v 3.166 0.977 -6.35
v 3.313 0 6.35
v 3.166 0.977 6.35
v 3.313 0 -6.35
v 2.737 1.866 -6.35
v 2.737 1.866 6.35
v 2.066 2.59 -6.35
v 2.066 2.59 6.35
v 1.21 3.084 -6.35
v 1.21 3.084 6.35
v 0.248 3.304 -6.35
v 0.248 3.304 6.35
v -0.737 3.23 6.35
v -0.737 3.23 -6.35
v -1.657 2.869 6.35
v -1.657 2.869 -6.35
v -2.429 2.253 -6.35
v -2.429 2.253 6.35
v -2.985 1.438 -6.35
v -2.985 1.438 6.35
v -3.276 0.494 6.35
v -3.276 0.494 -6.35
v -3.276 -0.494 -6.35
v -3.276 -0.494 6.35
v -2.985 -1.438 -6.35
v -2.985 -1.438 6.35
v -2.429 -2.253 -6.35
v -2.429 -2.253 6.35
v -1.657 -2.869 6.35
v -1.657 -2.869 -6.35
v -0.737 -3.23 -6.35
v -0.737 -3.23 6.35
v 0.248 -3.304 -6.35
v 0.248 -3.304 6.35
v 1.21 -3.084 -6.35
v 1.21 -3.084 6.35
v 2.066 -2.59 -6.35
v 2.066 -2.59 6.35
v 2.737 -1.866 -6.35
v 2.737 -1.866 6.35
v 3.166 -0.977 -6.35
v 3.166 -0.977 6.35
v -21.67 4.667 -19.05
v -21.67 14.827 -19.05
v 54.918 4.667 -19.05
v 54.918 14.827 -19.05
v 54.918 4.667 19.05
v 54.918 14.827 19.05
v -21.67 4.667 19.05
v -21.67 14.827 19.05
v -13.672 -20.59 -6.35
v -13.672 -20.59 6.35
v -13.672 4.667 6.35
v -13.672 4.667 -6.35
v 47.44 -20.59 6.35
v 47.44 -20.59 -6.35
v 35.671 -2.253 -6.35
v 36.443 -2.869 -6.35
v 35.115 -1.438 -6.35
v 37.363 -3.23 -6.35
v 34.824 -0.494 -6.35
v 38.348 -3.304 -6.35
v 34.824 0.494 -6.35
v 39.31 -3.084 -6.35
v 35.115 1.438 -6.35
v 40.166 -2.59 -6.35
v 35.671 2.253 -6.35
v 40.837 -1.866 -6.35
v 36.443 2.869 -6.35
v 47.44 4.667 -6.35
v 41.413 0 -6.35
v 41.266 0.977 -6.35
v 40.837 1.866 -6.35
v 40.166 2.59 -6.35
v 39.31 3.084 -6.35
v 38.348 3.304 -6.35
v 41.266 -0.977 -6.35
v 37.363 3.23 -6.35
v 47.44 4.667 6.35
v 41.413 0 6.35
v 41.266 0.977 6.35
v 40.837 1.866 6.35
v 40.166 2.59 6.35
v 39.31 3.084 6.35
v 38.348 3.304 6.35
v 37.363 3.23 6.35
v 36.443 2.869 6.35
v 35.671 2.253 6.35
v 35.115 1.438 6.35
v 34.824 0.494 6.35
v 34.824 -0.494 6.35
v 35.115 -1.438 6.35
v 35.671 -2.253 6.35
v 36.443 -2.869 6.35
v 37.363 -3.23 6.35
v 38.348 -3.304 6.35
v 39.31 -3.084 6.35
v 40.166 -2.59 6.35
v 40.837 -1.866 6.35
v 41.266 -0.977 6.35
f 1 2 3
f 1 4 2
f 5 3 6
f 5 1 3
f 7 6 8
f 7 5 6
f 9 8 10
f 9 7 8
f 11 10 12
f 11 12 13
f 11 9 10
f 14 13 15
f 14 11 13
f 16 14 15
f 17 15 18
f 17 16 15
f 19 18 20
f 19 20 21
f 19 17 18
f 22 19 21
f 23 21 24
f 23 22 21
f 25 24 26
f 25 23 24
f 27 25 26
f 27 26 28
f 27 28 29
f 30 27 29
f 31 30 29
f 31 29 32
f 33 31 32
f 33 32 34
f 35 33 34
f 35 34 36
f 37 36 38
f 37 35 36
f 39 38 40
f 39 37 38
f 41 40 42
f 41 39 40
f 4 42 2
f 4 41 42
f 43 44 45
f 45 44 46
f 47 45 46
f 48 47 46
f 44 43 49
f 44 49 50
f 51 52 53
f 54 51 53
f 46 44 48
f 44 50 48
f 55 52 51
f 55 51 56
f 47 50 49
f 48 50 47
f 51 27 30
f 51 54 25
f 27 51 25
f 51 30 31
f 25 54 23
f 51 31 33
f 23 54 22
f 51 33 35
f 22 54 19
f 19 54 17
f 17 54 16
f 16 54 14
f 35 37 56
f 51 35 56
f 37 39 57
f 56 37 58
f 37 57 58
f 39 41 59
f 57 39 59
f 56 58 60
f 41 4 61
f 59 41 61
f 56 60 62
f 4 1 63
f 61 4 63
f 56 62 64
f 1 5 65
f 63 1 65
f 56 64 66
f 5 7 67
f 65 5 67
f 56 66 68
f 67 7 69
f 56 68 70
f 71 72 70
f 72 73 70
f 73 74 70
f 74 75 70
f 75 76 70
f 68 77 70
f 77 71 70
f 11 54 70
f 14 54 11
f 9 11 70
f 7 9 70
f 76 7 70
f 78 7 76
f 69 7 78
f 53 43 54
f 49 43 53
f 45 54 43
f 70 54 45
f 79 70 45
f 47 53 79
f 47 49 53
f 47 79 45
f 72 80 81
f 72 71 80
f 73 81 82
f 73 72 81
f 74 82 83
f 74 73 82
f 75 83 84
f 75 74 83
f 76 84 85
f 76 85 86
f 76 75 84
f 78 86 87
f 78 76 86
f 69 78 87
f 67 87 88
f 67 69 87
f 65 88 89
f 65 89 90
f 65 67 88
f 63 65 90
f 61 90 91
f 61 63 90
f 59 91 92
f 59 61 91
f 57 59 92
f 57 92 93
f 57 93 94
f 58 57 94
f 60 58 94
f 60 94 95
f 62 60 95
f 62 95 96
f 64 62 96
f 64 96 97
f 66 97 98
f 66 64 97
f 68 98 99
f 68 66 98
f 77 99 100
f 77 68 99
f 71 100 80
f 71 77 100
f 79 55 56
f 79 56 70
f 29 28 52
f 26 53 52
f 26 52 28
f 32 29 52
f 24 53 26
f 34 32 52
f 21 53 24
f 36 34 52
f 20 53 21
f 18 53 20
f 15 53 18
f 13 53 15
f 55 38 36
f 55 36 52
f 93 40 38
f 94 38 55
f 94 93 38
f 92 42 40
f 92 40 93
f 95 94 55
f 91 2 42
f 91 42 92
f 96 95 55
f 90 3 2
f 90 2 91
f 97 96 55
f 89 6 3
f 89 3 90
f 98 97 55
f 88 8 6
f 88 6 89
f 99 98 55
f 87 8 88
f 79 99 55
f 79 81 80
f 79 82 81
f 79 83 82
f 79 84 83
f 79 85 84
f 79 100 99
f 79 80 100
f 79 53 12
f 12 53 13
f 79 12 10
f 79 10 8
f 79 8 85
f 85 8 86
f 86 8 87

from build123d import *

# Parameters (mm, degrees)
SKETCH2_W           = 61.111815401
SKETCH2_H           = 25.256192137
SKETCH2_R           = 3.313116642
BOSS_EXTRUDE6_DEPTH = 6.35
SKETCH2_5_W         = 76.588209157
SKETCH2_5_H         = 10.16
BOSS_EXTRUDE7_DEPTH = 19.05


with BuildPart() as part:
    # Sketch2 → Boss-Extrude6 (new, symmetric)
    with BuildSketch(Plane.XY):
        with Locations((16.884167922, -7.961511284)):
            Rectangle(SKETCH2_W, SKETCH2_H)
        Circle(SKETCH2_R, mode=Mode.SUBTRACT)
        with Locations((38.1, 0)):
            Circle(SKETCH2_R, mode=Mode.SUBTRACT)
    extrude(amount=BOSS_EXTRUDE6_DEPTH, both=True)

    # Sketch2<5> → Boss-Extrude7 (add, symmetric)
    with BuildSketch(Plane.XY):
        with Locations((16.624239124, 9.746584785)):
            Rectangle(SKETCH2_5_W, SKETCH2_5_H)
    extrude(amount=BOSS_EXTRUDE7_DEPTH, both=True)


solid = part.part
